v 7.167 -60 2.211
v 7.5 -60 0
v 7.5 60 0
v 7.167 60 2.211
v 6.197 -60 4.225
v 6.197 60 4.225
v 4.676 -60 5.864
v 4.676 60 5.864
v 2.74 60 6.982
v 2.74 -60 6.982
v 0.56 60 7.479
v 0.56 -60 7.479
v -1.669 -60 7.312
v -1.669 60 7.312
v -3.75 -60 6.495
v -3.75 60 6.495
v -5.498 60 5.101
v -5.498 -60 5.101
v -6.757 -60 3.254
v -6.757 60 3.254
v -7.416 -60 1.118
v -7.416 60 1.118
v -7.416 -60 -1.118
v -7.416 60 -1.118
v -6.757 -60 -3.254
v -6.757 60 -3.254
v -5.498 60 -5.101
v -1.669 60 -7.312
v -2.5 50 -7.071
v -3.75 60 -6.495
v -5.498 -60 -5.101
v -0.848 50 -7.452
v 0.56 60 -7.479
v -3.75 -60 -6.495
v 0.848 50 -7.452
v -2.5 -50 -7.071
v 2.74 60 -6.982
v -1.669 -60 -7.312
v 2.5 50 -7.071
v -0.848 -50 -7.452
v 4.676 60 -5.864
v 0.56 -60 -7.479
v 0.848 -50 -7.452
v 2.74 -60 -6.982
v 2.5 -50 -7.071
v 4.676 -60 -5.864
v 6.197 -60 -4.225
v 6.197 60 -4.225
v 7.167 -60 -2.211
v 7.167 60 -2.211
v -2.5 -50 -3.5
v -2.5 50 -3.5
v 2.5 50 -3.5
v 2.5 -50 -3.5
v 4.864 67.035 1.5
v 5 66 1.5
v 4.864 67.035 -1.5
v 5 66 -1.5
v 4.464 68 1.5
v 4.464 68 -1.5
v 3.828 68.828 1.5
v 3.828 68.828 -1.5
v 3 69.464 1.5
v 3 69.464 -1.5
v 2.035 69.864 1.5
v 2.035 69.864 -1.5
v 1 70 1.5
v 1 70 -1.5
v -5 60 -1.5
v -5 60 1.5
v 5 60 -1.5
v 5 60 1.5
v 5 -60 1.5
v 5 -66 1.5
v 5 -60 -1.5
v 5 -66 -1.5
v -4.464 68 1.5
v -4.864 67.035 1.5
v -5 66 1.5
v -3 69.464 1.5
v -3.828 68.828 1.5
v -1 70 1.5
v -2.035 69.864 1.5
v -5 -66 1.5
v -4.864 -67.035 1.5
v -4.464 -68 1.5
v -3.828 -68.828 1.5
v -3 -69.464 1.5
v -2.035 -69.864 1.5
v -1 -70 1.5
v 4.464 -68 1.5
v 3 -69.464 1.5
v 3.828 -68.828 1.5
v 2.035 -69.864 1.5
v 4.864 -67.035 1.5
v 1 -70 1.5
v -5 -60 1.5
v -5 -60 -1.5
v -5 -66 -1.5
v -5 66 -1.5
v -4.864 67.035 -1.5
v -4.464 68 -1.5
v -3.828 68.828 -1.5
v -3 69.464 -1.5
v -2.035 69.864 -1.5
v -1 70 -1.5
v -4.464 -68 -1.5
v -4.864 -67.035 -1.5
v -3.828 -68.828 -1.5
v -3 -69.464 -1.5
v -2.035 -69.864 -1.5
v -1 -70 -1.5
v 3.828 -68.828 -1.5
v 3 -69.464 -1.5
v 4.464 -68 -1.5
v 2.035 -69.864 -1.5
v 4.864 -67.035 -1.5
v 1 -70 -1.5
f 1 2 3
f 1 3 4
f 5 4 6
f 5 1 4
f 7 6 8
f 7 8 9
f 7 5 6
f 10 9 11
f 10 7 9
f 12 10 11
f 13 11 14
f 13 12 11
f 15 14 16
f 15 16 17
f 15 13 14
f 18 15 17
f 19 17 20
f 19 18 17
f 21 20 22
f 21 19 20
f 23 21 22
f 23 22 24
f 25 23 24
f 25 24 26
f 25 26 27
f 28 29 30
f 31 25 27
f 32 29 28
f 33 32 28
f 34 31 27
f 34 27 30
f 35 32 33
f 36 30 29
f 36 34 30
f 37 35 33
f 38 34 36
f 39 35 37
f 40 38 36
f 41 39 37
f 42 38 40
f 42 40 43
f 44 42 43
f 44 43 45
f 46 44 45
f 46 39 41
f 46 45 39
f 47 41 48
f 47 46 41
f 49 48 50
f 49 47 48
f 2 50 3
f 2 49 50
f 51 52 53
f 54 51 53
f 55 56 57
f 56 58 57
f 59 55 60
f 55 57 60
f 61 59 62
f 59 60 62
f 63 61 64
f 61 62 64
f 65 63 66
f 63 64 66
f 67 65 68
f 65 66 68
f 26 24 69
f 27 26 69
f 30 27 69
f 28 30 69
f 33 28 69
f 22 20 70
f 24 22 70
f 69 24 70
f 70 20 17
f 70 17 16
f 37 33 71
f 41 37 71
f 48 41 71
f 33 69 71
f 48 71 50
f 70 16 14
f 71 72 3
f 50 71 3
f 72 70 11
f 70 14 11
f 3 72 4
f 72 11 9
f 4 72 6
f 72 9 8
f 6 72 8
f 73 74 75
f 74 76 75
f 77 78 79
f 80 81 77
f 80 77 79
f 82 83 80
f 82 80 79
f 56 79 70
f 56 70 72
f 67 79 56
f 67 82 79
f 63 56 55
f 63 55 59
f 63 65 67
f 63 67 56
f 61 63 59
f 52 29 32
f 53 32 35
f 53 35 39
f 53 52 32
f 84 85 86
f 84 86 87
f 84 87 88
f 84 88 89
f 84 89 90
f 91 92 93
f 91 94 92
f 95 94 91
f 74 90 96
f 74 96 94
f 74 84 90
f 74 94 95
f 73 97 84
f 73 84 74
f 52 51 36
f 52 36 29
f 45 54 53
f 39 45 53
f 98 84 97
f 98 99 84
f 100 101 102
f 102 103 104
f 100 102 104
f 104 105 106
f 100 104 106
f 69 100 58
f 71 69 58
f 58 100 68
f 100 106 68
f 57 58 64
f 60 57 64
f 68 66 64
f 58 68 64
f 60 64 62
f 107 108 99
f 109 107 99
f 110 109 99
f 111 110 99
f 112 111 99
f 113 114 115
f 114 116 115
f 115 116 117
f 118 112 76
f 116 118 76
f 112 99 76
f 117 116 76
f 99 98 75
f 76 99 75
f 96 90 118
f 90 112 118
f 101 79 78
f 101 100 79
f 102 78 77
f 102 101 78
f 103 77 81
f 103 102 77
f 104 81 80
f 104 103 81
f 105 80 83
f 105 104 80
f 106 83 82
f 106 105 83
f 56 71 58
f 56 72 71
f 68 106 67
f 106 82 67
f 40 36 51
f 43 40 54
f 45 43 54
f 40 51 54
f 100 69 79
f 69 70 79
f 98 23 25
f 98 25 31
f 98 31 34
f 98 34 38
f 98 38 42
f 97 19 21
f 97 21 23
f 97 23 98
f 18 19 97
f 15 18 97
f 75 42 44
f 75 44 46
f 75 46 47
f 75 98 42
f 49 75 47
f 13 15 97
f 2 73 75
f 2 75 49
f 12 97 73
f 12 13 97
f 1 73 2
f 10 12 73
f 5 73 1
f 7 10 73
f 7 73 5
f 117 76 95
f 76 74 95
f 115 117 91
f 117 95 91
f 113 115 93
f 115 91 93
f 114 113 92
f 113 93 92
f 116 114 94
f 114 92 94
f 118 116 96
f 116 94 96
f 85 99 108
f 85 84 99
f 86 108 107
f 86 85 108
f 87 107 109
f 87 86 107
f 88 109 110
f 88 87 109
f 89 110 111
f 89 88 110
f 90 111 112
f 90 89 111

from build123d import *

# Parameters (mm, degrees)
SKETCH_R     = 7.5
PAD_DEPTH    = 60
SKETCH001_W  = 5
SKETCH001_H  = 100
POCKET_DEPTH = 4.001
SKETCH002_W  = 10
SKETCH002_H  = 10
PAD001_DEPTH = 1.5
FILLET_R     = 4


with BuildPart() as part:
    # Sketch → Pad (new body, symmetric)
    with BuildSketch(Plane.XZ):
        Circle(SKETCH_R)
    extrude(amount=PAD_DEPTH, both=True)

    # Sketch001 → Pocket (cut, through all)
    with BuildSketch(Plane.XY.offset(-3.5)):
        Rectangle(SKETCH001_W, SKETCH001_H)
    extrude(amount=-POCKET_DEPTH, mode=Mode.SUBTRACT)

    # Sketch002 → Pad001 (join, symmetric)
    with BuildSketch(Plane.XY):
        with Locations((0, -65)):
            Rectangle(SKETCH002_W, SKETCH002_H)
        with Locations((0, 65)):
            Rectangle(SKETCH002_W, SKETCH002_H)
    extrude(amount=PAD001_DEPTH, both=True)

    # Fillet
    fillet_edges = [part.edges().sort_by_distance(p)[0] for p in [
        (-5, 70, 0),
        (5, 70, 0),
        (5, -70, 0),
        (-5, -70, 0),
    ]]
    fillet(fillet_edges, radius=FILLET_R)


solid = part.part
